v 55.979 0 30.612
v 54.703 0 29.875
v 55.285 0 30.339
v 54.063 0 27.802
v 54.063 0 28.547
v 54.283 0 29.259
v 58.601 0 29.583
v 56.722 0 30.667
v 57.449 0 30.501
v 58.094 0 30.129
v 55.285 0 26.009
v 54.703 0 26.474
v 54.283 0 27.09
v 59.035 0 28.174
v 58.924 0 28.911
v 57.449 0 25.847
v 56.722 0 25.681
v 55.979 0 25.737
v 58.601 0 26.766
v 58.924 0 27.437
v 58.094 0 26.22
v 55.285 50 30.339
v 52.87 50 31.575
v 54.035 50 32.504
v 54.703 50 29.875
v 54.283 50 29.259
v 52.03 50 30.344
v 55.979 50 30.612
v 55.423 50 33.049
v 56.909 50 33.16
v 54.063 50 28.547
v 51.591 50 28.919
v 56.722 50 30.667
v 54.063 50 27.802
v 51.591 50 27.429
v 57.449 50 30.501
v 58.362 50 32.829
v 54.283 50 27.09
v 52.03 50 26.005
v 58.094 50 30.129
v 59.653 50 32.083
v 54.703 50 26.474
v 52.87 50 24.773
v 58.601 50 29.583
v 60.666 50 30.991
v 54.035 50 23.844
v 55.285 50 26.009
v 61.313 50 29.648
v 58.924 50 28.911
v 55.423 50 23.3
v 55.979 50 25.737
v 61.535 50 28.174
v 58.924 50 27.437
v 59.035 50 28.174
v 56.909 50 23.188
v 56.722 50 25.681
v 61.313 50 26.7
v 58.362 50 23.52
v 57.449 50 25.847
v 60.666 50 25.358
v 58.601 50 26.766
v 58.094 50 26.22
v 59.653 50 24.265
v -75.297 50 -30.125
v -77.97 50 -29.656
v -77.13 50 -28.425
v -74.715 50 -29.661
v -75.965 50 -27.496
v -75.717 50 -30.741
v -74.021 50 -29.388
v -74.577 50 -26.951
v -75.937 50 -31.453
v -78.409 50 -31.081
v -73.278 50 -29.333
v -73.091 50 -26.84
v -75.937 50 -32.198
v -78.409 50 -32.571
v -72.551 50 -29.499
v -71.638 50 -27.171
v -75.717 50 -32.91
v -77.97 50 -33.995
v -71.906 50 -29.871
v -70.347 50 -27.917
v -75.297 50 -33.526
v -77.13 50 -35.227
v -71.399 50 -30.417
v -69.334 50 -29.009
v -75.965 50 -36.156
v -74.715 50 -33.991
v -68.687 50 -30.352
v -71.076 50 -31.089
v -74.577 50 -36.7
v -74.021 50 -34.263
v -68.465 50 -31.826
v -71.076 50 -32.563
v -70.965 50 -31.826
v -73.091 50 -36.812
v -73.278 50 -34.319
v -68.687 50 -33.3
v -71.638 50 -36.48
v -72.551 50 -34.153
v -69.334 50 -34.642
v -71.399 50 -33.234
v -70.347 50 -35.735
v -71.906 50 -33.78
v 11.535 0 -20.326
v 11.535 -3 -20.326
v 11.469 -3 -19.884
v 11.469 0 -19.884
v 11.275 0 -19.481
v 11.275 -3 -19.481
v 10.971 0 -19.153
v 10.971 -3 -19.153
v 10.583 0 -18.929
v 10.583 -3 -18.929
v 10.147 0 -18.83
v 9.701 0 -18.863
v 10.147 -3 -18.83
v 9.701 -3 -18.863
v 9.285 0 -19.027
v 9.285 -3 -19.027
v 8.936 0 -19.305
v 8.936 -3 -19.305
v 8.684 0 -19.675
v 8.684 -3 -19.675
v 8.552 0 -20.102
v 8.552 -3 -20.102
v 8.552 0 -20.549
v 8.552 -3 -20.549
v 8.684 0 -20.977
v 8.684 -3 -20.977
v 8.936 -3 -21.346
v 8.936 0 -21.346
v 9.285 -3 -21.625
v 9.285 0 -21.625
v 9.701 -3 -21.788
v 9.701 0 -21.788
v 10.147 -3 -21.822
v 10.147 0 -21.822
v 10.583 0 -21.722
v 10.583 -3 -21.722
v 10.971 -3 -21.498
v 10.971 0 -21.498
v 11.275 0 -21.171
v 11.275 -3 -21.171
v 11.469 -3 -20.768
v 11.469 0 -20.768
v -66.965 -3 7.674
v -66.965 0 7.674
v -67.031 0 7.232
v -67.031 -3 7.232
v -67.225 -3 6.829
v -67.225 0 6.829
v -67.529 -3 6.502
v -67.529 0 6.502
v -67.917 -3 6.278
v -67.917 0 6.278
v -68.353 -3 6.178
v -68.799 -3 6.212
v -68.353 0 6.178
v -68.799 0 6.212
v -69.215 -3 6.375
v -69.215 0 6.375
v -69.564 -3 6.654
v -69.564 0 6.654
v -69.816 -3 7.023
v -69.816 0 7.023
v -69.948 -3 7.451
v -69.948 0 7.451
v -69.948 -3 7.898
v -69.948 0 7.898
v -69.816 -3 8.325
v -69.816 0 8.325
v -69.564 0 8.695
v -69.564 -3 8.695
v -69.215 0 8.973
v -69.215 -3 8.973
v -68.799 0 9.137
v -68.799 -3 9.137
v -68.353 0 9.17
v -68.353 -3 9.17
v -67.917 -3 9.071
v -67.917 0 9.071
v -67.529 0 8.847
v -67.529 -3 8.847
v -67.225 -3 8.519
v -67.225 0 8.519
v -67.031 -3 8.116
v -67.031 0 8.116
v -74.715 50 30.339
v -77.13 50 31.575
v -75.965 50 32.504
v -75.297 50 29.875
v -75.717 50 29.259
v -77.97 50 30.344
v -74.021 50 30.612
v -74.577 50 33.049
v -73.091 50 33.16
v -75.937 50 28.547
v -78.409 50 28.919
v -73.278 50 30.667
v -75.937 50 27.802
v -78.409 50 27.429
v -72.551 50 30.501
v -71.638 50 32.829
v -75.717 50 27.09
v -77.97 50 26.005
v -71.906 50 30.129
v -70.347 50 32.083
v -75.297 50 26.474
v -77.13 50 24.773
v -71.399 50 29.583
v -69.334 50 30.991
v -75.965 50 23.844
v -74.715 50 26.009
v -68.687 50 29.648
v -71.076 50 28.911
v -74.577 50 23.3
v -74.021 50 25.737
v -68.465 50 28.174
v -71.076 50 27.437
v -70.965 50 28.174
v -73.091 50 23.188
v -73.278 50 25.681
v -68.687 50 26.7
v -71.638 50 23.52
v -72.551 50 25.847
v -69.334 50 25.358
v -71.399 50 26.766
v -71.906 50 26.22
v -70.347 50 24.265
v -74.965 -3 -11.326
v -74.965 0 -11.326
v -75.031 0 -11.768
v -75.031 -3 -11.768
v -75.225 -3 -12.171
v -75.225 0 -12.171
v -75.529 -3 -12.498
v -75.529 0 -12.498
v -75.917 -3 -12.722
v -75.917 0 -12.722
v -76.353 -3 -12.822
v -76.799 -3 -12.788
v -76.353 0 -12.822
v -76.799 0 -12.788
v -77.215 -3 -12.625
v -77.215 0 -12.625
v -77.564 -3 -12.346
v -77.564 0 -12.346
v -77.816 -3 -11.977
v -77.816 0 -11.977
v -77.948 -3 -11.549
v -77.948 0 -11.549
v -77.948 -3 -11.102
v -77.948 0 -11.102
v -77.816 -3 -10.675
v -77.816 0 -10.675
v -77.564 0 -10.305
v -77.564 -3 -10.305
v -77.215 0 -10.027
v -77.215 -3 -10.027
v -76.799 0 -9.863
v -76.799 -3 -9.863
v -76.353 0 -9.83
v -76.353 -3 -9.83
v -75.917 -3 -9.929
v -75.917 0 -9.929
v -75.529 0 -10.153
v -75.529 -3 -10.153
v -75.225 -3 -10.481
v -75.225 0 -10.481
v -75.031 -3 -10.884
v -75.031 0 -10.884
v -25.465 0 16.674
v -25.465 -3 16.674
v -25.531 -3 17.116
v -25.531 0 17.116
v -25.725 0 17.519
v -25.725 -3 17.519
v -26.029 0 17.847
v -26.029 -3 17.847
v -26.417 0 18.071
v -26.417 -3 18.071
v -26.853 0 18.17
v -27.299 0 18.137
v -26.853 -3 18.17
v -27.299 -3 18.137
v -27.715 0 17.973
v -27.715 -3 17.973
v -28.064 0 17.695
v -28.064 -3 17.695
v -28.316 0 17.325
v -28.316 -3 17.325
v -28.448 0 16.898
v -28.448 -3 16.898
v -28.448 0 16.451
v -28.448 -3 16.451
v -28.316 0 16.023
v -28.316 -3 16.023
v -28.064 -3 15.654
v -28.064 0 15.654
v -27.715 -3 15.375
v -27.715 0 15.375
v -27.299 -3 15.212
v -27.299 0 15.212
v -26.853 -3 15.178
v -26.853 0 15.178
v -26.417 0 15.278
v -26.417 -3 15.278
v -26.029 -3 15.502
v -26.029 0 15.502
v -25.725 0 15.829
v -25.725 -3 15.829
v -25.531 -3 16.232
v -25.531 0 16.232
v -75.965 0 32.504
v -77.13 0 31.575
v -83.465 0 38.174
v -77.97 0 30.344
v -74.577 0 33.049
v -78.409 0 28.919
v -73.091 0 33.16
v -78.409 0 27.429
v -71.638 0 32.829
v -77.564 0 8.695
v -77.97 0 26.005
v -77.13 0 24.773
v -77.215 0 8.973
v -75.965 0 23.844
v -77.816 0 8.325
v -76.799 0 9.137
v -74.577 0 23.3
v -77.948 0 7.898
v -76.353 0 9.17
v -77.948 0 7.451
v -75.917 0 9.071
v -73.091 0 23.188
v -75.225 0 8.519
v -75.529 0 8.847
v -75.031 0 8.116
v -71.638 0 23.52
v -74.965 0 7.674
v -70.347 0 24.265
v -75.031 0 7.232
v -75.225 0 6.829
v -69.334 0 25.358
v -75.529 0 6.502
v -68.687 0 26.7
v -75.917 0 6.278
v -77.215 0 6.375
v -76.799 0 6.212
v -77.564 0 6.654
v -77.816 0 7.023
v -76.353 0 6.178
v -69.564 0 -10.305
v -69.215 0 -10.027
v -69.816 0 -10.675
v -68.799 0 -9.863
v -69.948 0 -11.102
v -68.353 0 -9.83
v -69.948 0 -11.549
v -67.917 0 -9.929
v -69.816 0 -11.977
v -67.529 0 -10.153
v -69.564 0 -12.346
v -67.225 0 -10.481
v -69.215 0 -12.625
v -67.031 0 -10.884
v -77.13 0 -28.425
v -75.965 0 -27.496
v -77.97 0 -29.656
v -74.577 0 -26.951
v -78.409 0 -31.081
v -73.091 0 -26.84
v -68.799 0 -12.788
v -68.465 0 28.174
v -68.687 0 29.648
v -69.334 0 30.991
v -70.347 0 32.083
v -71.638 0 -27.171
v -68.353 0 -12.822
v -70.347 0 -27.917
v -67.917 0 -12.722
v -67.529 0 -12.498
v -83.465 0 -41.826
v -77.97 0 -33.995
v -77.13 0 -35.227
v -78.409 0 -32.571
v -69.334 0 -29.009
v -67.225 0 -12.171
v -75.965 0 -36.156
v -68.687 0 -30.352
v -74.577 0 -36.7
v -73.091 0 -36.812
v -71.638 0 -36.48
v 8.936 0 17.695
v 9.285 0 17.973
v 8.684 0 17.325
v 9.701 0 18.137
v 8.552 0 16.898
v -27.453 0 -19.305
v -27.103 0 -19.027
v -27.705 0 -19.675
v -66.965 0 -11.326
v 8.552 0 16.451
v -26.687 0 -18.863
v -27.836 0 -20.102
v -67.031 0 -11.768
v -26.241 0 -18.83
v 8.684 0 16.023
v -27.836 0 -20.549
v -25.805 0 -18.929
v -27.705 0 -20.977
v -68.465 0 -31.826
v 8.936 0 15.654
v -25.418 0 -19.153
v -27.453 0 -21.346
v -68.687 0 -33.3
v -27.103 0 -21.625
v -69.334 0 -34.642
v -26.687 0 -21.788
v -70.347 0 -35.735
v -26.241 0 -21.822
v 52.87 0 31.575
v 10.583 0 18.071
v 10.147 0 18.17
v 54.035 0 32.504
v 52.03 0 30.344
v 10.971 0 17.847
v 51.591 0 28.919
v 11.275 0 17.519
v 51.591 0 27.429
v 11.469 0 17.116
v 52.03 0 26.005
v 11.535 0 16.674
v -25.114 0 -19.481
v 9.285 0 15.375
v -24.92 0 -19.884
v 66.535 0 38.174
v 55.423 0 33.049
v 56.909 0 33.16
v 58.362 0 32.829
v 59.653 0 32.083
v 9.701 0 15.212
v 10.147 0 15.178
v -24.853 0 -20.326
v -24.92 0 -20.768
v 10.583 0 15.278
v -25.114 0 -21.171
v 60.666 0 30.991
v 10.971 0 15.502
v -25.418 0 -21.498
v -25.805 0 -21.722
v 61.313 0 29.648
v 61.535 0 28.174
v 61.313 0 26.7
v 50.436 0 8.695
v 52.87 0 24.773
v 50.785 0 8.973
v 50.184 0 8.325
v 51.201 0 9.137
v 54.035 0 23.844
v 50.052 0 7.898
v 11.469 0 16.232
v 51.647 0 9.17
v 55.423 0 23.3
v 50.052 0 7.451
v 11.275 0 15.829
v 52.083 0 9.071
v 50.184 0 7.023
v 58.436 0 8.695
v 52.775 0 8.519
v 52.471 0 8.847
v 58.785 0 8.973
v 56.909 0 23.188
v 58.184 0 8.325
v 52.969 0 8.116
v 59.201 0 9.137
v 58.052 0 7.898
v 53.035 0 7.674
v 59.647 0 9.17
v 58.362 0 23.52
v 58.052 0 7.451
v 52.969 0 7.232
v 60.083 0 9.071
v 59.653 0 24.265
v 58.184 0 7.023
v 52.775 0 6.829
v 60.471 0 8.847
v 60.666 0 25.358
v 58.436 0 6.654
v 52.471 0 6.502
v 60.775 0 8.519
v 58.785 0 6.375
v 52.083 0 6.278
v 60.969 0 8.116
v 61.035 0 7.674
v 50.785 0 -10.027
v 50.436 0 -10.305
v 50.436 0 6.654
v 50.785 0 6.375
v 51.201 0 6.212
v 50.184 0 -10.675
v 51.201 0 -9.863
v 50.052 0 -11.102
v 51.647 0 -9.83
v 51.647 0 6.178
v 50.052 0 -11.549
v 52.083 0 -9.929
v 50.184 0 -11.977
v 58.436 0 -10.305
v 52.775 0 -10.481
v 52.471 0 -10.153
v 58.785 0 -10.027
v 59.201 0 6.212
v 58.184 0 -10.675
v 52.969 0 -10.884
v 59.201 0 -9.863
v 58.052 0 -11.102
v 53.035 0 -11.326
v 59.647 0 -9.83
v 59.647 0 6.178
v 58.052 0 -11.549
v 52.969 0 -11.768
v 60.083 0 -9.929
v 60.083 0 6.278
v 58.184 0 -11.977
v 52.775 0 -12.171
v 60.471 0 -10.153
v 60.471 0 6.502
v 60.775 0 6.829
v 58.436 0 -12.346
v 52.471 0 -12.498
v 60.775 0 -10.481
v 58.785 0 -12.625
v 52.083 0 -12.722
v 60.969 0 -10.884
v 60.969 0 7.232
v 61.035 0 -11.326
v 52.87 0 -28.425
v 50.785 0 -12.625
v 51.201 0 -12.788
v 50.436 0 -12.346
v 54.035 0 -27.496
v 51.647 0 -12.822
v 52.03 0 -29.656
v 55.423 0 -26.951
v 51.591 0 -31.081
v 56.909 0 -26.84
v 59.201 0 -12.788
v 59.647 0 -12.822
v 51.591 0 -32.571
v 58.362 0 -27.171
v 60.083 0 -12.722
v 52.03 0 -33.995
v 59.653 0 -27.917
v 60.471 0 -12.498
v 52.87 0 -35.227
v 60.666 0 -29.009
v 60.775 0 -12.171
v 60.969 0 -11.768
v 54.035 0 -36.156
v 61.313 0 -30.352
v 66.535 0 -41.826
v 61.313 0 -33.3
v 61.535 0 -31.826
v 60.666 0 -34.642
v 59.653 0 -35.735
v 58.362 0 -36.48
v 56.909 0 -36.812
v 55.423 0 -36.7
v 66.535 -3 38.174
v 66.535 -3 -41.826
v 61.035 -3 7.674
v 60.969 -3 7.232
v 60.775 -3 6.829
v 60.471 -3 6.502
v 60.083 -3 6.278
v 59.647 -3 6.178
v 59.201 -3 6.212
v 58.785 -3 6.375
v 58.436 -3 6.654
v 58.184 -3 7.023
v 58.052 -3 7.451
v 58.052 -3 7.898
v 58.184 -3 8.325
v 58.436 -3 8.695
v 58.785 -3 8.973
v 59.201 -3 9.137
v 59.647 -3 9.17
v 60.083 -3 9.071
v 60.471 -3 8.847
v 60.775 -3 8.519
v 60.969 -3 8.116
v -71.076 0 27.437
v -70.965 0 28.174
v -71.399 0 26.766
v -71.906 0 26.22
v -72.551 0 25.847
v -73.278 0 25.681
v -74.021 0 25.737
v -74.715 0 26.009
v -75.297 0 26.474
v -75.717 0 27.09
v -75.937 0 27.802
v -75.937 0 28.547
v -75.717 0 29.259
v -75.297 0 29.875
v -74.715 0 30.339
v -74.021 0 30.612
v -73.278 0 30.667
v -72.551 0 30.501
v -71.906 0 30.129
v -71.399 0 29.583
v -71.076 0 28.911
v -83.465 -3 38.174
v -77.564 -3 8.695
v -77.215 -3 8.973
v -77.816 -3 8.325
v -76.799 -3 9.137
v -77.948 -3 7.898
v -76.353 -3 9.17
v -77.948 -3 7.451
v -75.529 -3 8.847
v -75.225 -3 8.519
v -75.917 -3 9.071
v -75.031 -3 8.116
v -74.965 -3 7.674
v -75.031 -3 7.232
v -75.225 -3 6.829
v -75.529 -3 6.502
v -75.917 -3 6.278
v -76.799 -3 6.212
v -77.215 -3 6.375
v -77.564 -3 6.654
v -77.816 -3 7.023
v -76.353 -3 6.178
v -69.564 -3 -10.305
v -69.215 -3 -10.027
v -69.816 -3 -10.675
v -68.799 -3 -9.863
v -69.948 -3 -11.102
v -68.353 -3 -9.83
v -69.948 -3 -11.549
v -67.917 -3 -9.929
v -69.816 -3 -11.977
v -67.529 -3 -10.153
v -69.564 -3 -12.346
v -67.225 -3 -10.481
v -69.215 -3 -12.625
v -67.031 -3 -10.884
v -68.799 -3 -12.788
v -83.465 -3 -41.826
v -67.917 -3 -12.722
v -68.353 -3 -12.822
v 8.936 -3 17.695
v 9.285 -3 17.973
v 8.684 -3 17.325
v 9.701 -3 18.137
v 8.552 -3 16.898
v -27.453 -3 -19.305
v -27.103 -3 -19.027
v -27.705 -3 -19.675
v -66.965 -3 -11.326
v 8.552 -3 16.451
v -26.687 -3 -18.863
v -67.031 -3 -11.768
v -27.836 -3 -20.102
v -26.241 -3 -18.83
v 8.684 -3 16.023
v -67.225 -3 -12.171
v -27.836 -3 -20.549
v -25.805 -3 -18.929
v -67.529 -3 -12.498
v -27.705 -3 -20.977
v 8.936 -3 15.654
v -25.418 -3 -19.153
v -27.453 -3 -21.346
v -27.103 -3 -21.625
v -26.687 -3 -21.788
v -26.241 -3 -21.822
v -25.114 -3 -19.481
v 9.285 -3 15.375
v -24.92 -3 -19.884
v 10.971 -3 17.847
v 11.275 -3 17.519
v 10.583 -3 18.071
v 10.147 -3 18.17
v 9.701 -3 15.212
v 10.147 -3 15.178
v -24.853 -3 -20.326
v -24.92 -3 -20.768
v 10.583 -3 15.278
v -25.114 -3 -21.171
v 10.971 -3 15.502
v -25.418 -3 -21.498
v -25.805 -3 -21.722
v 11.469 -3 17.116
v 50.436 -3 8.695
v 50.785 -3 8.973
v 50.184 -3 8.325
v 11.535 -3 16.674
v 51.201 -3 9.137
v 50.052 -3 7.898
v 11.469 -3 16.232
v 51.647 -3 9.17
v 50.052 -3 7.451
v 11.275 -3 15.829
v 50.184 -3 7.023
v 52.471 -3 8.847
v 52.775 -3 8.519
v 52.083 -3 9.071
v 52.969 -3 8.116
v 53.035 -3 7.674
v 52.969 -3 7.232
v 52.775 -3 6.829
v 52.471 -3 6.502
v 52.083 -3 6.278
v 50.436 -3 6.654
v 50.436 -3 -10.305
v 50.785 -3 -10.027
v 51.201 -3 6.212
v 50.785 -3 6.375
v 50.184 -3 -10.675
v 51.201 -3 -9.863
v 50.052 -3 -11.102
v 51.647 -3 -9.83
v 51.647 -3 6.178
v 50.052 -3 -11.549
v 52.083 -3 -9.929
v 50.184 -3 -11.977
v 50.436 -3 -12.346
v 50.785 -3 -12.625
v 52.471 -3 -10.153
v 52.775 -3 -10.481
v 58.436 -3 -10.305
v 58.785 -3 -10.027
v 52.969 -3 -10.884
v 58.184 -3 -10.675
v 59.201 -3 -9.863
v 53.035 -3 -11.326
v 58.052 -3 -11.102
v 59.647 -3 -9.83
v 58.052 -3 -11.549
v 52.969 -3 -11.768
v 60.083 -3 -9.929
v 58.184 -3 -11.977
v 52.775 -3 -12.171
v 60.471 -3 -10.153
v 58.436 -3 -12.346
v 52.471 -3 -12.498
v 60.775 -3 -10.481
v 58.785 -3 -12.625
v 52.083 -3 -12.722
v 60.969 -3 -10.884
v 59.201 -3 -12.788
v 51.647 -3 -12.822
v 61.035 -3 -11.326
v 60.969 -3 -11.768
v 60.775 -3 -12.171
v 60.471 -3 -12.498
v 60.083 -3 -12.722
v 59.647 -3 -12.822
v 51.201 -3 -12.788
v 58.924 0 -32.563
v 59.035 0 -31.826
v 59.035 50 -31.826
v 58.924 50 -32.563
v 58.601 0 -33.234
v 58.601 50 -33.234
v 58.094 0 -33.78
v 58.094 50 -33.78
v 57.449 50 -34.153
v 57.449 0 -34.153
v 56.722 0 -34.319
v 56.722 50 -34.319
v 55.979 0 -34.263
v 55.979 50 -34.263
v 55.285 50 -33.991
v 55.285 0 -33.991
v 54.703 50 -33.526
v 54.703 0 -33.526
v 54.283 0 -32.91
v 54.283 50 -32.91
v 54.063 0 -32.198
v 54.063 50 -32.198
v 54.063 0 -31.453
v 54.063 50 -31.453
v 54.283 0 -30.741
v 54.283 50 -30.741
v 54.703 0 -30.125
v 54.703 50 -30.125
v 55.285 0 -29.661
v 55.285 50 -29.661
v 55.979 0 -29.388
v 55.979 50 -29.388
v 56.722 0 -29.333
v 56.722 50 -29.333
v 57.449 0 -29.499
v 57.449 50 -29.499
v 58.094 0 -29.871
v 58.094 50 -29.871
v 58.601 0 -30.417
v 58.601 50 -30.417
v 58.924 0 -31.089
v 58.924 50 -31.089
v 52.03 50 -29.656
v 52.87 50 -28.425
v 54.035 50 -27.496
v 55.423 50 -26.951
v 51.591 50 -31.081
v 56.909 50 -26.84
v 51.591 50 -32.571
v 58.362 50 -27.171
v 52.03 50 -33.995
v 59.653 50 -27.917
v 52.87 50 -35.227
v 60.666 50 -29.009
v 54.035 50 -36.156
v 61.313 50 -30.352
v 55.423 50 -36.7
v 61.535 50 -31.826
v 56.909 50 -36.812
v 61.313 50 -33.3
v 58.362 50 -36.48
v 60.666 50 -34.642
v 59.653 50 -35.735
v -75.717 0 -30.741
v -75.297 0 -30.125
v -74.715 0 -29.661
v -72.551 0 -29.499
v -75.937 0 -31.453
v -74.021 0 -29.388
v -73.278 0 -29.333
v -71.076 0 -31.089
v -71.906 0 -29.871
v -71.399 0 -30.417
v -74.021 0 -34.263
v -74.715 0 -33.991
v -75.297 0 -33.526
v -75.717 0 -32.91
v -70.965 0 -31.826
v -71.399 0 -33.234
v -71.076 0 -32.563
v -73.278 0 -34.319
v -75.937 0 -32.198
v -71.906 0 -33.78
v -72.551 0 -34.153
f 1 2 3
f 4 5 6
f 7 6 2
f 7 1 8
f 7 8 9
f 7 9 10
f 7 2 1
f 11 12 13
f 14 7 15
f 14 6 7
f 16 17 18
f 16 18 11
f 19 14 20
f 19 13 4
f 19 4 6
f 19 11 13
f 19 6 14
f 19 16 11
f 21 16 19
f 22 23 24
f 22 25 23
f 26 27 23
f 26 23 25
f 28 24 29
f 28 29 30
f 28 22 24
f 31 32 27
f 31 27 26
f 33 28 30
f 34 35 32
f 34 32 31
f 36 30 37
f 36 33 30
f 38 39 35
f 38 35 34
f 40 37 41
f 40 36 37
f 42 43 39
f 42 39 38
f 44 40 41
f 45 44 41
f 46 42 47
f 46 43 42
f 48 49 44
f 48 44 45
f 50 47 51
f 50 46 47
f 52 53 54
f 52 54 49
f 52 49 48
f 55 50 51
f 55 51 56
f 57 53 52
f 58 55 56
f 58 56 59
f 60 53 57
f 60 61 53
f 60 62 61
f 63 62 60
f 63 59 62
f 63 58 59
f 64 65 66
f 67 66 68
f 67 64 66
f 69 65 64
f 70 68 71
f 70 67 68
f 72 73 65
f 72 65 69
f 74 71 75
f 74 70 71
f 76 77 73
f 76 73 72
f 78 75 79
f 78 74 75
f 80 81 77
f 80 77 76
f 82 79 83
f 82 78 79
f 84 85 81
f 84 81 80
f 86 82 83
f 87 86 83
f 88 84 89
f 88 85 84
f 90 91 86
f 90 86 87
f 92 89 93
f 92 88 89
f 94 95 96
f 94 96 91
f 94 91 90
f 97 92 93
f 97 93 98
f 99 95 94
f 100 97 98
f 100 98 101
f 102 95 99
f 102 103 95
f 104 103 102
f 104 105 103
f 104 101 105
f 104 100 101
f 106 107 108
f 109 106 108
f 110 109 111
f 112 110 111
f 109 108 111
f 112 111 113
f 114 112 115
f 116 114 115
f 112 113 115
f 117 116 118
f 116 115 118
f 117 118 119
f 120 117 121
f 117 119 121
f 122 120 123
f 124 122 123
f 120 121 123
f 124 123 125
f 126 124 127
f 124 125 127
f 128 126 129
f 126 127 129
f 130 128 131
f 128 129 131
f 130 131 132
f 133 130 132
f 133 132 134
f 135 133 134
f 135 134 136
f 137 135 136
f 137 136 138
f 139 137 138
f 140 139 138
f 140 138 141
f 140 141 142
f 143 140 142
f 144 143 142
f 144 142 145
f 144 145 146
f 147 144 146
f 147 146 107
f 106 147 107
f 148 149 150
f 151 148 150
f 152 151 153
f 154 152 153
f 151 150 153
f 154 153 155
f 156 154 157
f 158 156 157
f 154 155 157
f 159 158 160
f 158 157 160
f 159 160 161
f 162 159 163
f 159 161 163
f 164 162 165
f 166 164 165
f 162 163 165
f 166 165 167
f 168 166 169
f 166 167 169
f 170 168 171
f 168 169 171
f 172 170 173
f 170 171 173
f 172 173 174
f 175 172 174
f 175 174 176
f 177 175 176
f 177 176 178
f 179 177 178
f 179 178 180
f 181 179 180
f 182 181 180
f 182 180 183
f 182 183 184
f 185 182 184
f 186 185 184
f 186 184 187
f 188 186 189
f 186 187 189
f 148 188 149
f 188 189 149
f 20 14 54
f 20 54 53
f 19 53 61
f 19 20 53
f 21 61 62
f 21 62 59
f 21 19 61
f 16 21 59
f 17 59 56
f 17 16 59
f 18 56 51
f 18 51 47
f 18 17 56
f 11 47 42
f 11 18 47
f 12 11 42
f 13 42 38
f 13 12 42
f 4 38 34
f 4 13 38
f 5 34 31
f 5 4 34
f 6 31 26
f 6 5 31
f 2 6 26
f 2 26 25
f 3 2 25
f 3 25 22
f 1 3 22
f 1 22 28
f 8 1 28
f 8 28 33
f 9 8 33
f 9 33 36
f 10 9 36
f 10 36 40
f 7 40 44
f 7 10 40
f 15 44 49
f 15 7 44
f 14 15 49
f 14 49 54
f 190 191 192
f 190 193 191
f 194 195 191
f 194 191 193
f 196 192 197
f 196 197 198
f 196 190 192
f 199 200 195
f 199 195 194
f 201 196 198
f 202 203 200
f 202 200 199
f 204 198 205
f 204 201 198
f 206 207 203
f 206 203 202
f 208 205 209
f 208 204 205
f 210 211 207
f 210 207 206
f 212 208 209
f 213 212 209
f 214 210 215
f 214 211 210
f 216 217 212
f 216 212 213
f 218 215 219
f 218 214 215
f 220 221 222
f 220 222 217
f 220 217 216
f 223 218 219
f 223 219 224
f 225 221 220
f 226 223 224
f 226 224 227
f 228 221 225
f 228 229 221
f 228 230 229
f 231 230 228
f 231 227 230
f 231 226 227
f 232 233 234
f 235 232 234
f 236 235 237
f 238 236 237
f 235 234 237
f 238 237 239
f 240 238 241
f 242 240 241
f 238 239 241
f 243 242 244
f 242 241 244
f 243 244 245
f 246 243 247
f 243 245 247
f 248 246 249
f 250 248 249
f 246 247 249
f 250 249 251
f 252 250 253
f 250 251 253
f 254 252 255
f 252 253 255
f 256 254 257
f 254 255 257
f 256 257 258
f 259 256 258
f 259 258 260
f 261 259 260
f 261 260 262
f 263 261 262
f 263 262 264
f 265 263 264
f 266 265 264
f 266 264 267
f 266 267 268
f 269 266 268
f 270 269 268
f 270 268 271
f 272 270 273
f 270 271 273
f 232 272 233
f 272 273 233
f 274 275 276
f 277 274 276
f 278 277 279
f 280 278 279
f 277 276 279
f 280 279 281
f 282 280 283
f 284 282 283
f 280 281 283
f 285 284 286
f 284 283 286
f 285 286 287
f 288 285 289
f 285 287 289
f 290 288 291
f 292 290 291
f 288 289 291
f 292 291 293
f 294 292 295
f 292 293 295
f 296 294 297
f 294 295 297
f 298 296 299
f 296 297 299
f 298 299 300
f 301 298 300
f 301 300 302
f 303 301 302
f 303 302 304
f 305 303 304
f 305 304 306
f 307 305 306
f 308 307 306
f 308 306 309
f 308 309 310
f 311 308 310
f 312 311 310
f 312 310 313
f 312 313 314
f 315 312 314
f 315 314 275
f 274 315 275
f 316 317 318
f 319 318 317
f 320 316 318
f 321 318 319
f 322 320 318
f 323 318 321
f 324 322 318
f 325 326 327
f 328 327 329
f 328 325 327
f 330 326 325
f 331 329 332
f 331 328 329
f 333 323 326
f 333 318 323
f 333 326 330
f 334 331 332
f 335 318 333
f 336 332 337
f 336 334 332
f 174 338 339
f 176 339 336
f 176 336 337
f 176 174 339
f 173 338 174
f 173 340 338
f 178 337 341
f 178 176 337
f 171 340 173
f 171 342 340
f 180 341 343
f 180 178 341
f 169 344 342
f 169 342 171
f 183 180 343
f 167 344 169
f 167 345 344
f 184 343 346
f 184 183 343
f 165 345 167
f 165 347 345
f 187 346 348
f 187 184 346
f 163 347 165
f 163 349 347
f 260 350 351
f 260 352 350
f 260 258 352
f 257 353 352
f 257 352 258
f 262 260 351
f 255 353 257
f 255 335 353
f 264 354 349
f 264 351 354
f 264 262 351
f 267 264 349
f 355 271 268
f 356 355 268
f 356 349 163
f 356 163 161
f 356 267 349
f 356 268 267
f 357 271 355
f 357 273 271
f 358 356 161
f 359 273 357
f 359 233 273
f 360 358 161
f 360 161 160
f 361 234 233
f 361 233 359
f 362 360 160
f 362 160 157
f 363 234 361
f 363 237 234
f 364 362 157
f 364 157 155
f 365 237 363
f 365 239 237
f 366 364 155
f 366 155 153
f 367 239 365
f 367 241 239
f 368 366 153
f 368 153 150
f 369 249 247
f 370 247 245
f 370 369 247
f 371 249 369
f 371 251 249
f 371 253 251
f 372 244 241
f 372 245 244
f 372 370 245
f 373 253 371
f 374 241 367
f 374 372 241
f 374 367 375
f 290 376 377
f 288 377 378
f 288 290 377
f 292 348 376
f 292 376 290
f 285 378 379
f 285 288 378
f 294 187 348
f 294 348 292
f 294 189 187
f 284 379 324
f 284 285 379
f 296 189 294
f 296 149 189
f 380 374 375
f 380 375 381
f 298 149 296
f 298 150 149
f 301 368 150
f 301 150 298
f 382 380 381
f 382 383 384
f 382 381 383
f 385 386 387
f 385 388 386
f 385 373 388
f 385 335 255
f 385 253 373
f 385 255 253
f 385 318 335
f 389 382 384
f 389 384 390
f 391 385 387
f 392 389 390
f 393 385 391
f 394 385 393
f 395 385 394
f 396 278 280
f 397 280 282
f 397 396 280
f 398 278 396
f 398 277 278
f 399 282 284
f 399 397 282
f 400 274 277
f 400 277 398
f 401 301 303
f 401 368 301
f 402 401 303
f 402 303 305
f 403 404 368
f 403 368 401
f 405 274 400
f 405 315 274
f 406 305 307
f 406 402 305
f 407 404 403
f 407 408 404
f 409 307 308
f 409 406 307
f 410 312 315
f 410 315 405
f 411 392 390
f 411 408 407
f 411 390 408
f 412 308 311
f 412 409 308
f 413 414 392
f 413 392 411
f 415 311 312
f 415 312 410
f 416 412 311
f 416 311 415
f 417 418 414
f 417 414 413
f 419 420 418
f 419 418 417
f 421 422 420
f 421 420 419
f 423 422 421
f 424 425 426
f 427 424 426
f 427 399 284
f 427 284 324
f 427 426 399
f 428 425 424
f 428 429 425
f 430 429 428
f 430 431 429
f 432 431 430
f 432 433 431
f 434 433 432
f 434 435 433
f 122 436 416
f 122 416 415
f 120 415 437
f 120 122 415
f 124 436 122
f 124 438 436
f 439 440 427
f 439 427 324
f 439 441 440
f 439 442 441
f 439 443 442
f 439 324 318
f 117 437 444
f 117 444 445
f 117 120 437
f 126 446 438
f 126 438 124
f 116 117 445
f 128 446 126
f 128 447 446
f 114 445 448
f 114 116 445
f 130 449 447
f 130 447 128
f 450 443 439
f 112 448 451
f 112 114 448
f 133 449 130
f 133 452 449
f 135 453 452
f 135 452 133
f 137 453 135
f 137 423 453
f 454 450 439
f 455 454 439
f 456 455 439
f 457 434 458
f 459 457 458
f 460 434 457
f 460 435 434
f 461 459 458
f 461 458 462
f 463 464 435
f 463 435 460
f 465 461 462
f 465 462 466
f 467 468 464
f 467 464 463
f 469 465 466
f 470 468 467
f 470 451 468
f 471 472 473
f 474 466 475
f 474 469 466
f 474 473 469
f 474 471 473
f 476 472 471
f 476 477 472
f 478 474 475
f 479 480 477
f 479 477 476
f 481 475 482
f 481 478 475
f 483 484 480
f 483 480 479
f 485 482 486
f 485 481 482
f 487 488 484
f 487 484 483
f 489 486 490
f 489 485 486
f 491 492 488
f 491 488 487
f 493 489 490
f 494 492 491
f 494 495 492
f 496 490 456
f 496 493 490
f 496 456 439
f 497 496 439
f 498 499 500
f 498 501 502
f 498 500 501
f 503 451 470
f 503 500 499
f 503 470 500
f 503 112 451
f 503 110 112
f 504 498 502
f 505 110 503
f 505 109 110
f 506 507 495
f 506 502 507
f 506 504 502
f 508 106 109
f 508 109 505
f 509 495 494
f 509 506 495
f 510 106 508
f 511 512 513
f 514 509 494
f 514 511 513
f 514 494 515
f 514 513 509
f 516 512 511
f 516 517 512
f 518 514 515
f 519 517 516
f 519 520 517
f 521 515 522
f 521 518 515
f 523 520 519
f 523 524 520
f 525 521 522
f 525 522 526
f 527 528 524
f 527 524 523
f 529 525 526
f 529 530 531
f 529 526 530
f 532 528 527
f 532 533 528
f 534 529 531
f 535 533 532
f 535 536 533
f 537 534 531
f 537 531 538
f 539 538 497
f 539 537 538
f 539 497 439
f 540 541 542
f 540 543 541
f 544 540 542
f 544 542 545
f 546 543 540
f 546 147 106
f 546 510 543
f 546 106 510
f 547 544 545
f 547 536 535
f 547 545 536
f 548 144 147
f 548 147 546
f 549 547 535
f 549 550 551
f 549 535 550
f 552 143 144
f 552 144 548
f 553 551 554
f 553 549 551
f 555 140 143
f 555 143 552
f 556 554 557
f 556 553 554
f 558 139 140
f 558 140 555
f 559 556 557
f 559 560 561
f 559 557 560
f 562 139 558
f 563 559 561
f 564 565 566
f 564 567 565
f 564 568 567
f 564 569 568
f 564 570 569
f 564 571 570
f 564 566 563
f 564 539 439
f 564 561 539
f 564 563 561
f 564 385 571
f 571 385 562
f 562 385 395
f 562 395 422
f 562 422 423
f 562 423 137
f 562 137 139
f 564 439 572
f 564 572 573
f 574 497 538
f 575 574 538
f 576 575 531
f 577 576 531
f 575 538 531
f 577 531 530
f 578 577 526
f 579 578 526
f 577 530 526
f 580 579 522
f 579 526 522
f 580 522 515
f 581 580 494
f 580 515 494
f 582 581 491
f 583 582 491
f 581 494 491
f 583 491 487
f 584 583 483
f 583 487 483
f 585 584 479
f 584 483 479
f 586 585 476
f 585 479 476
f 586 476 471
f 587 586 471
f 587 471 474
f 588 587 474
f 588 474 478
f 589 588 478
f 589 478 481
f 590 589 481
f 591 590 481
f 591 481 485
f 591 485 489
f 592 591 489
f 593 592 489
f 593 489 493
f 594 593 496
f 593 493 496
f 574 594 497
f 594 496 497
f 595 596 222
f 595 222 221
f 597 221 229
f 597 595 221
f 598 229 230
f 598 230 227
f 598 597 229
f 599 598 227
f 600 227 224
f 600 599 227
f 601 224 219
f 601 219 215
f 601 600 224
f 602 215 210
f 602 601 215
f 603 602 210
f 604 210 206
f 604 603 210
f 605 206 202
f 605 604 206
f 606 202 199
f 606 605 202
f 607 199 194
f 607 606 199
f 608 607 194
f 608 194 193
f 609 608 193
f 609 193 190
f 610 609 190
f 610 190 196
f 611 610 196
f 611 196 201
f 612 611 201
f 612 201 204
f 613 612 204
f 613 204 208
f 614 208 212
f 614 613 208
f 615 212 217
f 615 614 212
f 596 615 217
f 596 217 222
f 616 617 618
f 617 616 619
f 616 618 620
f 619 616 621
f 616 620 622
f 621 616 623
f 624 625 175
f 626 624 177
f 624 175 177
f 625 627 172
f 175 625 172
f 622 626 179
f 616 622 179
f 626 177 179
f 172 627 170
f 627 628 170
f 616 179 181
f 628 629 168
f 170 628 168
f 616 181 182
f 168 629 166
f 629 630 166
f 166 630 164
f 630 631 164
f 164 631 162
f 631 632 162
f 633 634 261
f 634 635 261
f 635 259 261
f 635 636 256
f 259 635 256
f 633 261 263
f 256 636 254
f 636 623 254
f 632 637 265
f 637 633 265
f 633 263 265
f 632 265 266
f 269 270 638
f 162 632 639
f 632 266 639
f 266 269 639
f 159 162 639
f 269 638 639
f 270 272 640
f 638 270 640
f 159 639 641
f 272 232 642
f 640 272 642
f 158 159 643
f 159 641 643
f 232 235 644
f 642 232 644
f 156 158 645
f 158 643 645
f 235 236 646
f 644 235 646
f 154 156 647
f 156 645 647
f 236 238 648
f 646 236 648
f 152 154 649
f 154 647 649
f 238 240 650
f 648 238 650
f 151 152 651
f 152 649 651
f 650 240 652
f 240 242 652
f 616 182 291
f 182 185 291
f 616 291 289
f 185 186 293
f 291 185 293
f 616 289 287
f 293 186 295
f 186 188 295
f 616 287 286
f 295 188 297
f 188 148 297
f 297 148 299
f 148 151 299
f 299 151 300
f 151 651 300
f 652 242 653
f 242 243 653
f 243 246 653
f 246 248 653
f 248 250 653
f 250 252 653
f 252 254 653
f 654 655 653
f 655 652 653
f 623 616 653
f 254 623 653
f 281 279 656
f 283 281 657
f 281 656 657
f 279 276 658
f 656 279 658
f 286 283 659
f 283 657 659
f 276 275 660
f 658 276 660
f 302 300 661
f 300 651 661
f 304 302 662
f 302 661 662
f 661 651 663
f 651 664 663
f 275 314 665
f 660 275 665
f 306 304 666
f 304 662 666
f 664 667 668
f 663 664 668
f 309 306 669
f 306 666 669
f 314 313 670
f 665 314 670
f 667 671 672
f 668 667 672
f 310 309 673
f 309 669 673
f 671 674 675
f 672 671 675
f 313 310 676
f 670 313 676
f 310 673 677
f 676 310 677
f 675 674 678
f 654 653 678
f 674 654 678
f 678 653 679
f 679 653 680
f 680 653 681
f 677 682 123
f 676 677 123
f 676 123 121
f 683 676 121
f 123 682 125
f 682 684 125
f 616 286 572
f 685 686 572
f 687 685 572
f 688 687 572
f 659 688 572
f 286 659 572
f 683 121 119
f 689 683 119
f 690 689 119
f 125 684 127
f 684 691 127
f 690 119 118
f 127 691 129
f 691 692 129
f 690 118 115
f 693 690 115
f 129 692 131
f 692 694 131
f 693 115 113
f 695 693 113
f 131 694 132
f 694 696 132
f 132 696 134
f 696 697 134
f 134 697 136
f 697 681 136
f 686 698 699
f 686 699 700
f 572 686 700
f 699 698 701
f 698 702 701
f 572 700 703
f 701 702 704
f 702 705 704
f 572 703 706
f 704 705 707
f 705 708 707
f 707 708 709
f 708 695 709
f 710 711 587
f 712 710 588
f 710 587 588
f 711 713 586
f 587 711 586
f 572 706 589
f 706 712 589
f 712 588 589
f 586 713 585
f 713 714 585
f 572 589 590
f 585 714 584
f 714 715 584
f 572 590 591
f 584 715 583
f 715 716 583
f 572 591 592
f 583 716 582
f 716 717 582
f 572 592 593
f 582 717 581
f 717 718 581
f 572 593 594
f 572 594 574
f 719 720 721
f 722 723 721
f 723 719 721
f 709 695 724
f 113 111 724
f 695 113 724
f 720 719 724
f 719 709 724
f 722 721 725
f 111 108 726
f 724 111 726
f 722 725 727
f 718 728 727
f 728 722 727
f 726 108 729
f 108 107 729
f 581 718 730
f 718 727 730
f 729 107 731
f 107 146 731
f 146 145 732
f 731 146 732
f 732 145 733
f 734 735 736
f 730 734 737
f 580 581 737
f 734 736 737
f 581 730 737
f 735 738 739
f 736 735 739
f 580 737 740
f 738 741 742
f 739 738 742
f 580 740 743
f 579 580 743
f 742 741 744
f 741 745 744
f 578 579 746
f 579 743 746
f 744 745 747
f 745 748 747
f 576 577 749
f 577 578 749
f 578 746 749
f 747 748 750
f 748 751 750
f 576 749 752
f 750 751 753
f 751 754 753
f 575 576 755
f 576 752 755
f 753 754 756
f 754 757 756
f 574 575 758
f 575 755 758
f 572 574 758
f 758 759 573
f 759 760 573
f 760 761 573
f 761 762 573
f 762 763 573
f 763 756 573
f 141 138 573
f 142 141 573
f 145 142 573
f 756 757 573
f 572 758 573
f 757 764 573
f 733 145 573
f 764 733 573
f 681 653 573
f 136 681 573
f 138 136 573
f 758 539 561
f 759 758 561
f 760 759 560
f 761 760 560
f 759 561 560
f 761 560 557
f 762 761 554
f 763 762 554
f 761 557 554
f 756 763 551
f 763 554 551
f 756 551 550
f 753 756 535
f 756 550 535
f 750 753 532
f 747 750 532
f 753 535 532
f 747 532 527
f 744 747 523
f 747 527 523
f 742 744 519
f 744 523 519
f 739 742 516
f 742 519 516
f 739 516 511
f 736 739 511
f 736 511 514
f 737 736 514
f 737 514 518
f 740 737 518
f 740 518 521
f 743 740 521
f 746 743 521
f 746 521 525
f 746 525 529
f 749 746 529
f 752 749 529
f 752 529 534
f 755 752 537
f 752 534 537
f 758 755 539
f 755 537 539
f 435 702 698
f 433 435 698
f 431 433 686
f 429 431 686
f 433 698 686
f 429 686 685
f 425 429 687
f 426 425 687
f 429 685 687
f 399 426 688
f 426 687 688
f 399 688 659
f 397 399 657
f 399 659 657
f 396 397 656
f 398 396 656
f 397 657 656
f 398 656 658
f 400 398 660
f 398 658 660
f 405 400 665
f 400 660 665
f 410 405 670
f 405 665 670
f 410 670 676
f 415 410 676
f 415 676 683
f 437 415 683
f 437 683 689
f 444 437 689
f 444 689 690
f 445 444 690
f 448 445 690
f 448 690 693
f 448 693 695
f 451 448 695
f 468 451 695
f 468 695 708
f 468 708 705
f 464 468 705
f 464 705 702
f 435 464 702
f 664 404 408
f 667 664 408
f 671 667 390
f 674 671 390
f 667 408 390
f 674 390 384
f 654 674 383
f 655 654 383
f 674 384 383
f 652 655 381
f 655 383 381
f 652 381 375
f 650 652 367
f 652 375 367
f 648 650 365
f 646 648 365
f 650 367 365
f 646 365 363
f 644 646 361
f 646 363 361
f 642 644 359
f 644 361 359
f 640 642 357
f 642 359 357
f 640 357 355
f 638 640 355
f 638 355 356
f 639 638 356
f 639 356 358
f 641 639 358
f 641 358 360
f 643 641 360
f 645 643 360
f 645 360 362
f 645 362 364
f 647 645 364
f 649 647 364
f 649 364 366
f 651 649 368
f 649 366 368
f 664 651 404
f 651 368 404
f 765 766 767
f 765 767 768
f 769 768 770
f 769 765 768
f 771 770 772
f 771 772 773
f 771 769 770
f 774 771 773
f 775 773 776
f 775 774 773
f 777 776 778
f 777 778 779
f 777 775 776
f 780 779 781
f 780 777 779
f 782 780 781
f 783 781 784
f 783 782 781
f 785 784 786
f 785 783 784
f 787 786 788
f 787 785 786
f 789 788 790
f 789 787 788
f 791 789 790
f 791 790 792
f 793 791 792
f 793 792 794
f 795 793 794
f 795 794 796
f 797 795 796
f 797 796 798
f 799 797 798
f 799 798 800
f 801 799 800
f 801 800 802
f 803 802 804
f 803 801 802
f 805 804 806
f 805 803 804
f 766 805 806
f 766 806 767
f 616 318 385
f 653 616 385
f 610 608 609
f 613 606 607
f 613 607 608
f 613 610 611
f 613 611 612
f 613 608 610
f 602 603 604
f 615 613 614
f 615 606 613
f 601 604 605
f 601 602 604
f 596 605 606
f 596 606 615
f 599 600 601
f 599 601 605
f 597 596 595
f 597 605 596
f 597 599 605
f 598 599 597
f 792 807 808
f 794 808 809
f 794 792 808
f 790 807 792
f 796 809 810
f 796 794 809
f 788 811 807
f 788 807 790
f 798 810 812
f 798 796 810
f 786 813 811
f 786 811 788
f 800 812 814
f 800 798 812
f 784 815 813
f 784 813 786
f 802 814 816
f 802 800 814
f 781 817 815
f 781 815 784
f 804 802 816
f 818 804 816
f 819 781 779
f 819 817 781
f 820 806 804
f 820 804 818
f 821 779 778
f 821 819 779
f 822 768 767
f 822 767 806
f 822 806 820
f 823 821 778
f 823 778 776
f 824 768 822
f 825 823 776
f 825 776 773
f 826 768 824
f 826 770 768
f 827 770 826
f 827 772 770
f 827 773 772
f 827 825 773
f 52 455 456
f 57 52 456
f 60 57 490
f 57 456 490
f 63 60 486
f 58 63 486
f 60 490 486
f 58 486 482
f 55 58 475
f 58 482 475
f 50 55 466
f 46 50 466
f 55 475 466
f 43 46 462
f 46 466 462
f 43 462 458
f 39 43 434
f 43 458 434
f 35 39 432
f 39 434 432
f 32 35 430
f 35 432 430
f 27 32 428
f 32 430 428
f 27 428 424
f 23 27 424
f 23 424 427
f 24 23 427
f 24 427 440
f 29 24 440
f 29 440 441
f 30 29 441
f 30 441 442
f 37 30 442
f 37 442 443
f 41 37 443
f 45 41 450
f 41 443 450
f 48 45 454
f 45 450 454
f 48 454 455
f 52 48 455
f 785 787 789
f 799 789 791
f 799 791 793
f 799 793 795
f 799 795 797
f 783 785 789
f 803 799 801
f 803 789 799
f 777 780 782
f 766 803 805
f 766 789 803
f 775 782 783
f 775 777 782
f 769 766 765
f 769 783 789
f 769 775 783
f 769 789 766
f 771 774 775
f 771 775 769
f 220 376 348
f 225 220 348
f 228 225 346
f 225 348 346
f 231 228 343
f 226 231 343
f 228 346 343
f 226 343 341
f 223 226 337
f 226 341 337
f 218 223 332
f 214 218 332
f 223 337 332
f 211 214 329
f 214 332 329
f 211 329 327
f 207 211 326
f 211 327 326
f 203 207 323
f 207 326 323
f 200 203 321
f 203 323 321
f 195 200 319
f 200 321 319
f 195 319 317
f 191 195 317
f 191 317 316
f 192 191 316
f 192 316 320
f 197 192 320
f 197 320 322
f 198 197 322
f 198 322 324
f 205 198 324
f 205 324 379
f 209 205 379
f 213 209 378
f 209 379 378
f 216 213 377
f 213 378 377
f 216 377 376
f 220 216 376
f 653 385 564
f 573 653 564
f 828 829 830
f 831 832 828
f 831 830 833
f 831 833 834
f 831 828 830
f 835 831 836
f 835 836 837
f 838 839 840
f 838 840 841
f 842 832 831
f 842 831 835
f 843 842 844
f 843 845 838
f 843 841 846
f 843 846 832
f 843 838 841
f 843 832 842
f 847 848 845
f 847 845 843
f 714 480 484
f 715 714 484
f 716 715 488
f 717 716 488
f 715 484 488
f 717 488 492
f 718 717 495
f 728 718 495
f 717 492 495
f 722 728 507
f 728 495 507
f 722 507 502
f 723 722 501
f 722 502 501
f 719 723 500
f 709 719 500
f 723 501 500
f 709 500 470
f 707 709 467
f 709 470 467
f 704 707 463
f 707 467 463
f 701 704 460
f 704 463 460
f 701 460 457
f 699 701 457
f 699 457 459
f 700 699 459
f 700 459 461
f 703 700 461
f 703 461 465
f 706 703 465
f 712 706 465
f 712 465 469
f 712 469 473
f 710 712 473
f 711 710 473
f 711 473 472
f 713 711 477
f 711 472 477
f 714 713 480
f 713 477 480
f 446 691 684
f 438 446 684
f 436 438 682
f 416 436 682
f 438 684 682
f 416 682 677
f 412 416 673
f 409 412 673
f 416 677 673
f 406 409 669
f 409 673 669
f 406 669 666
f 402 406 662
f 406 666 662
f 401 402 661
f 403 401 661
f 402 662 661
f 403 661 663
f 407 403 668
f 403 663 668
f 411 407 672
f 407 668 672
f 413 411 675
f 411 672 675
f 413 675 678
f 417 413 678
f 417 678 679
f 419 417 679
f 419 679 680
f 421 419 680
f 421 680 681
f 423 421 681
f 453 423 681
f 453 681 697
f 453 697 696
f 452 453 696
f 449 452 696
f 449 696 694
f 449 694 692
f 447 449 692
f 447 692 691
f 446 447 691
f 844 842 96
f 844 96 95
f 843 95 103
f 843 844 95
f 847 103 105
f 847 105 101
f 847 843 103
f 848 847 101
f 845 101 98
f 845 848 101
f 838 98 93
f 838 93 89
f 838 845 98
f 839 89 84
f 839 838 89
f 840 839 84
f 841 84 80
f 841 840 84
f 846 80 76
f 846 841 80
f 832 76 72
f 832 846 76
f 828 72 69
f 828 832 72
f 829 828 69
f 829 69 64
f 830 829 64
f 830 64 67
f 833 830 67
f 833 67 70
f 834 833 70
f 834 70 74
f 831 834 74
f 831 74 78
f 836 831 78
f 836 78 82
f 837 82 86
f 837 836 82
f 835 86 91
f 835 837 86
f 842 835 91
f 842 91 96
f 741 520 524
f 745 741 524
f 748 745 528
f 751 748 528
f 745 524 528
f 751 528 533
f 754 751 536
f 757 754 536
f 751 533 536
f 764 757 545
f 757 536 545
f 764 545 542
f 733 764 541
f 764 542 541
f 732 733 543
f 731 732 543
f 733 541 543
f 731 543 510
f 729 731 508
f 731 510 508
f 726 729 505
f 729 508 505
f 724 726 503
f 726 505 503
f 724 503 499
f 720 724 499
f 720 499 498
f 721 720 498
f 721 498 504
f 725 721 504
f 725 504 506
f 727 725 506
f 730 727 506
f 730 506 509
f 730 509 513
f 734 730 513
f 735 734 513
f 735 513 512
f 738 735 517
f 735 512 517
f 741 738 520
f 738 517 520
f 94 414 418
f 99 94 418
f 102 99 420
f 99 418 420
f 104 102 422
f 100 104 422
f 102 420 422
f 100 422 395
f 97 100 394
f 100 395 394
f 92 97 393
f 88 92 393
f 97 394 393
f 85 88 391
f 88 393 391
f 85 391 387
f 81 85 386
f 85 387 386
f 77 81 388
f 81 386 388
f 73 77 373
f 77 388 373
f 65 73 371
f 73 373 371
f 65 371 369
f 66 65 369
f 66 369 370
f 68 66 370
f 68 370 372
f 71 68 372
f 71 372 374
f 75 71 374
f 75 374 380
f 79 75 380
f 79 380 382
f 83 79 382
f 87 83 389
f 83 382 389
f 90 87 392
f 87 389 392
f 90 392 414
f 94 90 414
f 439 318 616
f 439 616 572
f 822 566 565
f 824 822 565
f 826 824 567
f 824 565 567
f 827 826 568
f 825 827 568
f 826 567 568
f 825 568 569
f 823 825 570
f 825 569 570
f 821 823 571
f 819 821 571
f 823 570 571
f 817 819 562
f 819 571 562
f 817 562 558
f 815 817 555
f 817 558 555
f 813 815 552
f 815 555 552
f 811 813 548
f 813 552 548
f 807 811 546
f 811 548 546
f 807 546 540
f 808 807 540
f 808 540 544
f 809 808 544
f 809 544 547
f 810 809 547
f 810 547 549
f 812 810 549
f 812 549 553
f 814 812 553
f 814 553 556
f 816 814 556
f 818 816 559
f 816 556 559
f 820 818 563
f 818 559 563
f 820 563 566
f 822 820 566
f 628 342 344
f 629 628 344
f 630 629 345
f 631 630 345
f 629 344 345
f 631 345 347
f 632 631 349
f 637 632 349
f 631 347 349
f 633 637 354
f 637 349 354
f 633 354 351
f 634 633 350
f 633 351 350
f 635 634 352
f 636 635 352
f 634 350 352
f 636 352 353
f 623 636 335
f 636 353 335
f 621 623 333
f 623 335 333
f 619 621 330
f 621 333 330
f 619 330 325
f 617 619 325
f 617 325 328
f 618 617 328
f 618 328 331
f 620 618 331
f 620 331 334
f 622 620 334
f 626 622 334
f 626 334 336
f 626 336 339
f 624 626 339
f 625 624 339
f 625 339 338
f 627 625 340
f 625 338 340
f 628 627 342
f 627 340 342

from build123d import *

# Parameters (mm, degrees)
SKETCH2_W           = 150
SKETCH2_H           = 80
SKETCH2_R           = 1.5
BOSS_EXTRUDE1_DEPTH = 3
SKETCH3_R           = 5
SKETCH3_R_2         = 2.5
BOSS_EXTRUDE2_DEPTH = 50
SKETCH4_R           = 1.5
CUT_EXTRUDE1_DEPTH  = 10


with BuildPart() as part:
    # Sketch2 → Boss-Extrude1 (new body)
    with BuildSketch(Plane(origin=(0, 0, 0), x_dir=(1, 0, 0), z_dir=(0, 1, 0))):
        with Locations((-8.46473029, 1.825726141)):
            Rectangle(SKETCH2_W, SKETCH2_H)
        with Locations((-68.46473029, 11.325726141)):
            Circle(SKETCH2_R, mode=Mode.SUBTRACT)
        with Locations((-68.46473029, -7.674273859)):
            Circle(SKETCH2_R, mode=Mode.SUBTRACT)
        with Locations((-76.46473029, 11.325726141)):
            Circle(SKETCH2_R, mode=Mode.SUBTRACT)
        with Locations((-76.46473029, -7.674273859)):
            Circle(SKETCH2_R, mode=Mode.SUBTRACT)
        with Locations((51.53526971, -7.674273859)):
            Circle(SKETCH2_R, mode=Mode.SUBTRACT)
        with Locations((59.53526971, -7.674273859)):
            Circle(SKETCH2_R, mode=Mode.SUBTRACT)
        with Locations((59.53526971, 11.325726141)):
            Circle(SKETCH2_R, mode=Mode.SUBTRACT)
        with Locations((51.53526971, 11.325726141)):
            Circle(SKETCH2_R, mode=Mode.SUBTRACT)
    extrude(amount=-BOSS_EXTRUDE1_DEPTH)

    # Sketch3 → Boss-Extrude2 (add)
    with BuildSketch(Plane(origin=(0, 0, 0), x_dir=(1, 0, 0), z_dir=(0, 1, 0))):
        with Locations((-73.46473029, 31.825726141)):
            Circle(SKETCH3_R)
        with Locations((-73.46473029, 31.825726141)):
            Circle(SKETCH3_R_2, mode=Mode.SUBTRACT)
        with Locations((56.53526971, 31.825726141)):
            Circle(SKETCH3_R)
        with Locations((56.53526971, 31.825726141)):
            Circle(SKETCH3_R_2, mode=Mode.SUBTRACT)
        with Locations((56.53526971, -28.174273859)):
            Circle(SKETCH3_R)
        with Locations((56.53526971, -28.174273859)):
            Circle(SKETCH3_R_2, mode=Mode.SUBTRACT)
        with Locations((-73.46473029, -28.174273859)):
            Circle(SKETCH3_R)
        with Locations((-73.46473029, -28.174273859)):
            Circle(SKETCH3_R_2, mode=Mode.SUBTRACT)
    extrude(amount=BOSS_EXTRUDE2_DEPTH)

    # Sketch4 → Cut-Extrude1 (cut)
    with BuildSketch(Plane.XZ.offset(3)):
        with Locations((-26.96473029, 16.674273859)):
            Circle(SKETCH4_R)
        with Locations((10.03526971, 16.674273859)):
            Circle(SKETCH4_R)
        with Locations((10.03526971, -20.325726141)):
            Circle(SKETCH4_R)
        with Locations((-26.353154243, -20.325726141)):
            Circle(SKETCH4_R)
    extrude(amount=-CUT_EXTRUDE1_DEPTH, mode=Mode.SUBTRACT)


solid = part.part
